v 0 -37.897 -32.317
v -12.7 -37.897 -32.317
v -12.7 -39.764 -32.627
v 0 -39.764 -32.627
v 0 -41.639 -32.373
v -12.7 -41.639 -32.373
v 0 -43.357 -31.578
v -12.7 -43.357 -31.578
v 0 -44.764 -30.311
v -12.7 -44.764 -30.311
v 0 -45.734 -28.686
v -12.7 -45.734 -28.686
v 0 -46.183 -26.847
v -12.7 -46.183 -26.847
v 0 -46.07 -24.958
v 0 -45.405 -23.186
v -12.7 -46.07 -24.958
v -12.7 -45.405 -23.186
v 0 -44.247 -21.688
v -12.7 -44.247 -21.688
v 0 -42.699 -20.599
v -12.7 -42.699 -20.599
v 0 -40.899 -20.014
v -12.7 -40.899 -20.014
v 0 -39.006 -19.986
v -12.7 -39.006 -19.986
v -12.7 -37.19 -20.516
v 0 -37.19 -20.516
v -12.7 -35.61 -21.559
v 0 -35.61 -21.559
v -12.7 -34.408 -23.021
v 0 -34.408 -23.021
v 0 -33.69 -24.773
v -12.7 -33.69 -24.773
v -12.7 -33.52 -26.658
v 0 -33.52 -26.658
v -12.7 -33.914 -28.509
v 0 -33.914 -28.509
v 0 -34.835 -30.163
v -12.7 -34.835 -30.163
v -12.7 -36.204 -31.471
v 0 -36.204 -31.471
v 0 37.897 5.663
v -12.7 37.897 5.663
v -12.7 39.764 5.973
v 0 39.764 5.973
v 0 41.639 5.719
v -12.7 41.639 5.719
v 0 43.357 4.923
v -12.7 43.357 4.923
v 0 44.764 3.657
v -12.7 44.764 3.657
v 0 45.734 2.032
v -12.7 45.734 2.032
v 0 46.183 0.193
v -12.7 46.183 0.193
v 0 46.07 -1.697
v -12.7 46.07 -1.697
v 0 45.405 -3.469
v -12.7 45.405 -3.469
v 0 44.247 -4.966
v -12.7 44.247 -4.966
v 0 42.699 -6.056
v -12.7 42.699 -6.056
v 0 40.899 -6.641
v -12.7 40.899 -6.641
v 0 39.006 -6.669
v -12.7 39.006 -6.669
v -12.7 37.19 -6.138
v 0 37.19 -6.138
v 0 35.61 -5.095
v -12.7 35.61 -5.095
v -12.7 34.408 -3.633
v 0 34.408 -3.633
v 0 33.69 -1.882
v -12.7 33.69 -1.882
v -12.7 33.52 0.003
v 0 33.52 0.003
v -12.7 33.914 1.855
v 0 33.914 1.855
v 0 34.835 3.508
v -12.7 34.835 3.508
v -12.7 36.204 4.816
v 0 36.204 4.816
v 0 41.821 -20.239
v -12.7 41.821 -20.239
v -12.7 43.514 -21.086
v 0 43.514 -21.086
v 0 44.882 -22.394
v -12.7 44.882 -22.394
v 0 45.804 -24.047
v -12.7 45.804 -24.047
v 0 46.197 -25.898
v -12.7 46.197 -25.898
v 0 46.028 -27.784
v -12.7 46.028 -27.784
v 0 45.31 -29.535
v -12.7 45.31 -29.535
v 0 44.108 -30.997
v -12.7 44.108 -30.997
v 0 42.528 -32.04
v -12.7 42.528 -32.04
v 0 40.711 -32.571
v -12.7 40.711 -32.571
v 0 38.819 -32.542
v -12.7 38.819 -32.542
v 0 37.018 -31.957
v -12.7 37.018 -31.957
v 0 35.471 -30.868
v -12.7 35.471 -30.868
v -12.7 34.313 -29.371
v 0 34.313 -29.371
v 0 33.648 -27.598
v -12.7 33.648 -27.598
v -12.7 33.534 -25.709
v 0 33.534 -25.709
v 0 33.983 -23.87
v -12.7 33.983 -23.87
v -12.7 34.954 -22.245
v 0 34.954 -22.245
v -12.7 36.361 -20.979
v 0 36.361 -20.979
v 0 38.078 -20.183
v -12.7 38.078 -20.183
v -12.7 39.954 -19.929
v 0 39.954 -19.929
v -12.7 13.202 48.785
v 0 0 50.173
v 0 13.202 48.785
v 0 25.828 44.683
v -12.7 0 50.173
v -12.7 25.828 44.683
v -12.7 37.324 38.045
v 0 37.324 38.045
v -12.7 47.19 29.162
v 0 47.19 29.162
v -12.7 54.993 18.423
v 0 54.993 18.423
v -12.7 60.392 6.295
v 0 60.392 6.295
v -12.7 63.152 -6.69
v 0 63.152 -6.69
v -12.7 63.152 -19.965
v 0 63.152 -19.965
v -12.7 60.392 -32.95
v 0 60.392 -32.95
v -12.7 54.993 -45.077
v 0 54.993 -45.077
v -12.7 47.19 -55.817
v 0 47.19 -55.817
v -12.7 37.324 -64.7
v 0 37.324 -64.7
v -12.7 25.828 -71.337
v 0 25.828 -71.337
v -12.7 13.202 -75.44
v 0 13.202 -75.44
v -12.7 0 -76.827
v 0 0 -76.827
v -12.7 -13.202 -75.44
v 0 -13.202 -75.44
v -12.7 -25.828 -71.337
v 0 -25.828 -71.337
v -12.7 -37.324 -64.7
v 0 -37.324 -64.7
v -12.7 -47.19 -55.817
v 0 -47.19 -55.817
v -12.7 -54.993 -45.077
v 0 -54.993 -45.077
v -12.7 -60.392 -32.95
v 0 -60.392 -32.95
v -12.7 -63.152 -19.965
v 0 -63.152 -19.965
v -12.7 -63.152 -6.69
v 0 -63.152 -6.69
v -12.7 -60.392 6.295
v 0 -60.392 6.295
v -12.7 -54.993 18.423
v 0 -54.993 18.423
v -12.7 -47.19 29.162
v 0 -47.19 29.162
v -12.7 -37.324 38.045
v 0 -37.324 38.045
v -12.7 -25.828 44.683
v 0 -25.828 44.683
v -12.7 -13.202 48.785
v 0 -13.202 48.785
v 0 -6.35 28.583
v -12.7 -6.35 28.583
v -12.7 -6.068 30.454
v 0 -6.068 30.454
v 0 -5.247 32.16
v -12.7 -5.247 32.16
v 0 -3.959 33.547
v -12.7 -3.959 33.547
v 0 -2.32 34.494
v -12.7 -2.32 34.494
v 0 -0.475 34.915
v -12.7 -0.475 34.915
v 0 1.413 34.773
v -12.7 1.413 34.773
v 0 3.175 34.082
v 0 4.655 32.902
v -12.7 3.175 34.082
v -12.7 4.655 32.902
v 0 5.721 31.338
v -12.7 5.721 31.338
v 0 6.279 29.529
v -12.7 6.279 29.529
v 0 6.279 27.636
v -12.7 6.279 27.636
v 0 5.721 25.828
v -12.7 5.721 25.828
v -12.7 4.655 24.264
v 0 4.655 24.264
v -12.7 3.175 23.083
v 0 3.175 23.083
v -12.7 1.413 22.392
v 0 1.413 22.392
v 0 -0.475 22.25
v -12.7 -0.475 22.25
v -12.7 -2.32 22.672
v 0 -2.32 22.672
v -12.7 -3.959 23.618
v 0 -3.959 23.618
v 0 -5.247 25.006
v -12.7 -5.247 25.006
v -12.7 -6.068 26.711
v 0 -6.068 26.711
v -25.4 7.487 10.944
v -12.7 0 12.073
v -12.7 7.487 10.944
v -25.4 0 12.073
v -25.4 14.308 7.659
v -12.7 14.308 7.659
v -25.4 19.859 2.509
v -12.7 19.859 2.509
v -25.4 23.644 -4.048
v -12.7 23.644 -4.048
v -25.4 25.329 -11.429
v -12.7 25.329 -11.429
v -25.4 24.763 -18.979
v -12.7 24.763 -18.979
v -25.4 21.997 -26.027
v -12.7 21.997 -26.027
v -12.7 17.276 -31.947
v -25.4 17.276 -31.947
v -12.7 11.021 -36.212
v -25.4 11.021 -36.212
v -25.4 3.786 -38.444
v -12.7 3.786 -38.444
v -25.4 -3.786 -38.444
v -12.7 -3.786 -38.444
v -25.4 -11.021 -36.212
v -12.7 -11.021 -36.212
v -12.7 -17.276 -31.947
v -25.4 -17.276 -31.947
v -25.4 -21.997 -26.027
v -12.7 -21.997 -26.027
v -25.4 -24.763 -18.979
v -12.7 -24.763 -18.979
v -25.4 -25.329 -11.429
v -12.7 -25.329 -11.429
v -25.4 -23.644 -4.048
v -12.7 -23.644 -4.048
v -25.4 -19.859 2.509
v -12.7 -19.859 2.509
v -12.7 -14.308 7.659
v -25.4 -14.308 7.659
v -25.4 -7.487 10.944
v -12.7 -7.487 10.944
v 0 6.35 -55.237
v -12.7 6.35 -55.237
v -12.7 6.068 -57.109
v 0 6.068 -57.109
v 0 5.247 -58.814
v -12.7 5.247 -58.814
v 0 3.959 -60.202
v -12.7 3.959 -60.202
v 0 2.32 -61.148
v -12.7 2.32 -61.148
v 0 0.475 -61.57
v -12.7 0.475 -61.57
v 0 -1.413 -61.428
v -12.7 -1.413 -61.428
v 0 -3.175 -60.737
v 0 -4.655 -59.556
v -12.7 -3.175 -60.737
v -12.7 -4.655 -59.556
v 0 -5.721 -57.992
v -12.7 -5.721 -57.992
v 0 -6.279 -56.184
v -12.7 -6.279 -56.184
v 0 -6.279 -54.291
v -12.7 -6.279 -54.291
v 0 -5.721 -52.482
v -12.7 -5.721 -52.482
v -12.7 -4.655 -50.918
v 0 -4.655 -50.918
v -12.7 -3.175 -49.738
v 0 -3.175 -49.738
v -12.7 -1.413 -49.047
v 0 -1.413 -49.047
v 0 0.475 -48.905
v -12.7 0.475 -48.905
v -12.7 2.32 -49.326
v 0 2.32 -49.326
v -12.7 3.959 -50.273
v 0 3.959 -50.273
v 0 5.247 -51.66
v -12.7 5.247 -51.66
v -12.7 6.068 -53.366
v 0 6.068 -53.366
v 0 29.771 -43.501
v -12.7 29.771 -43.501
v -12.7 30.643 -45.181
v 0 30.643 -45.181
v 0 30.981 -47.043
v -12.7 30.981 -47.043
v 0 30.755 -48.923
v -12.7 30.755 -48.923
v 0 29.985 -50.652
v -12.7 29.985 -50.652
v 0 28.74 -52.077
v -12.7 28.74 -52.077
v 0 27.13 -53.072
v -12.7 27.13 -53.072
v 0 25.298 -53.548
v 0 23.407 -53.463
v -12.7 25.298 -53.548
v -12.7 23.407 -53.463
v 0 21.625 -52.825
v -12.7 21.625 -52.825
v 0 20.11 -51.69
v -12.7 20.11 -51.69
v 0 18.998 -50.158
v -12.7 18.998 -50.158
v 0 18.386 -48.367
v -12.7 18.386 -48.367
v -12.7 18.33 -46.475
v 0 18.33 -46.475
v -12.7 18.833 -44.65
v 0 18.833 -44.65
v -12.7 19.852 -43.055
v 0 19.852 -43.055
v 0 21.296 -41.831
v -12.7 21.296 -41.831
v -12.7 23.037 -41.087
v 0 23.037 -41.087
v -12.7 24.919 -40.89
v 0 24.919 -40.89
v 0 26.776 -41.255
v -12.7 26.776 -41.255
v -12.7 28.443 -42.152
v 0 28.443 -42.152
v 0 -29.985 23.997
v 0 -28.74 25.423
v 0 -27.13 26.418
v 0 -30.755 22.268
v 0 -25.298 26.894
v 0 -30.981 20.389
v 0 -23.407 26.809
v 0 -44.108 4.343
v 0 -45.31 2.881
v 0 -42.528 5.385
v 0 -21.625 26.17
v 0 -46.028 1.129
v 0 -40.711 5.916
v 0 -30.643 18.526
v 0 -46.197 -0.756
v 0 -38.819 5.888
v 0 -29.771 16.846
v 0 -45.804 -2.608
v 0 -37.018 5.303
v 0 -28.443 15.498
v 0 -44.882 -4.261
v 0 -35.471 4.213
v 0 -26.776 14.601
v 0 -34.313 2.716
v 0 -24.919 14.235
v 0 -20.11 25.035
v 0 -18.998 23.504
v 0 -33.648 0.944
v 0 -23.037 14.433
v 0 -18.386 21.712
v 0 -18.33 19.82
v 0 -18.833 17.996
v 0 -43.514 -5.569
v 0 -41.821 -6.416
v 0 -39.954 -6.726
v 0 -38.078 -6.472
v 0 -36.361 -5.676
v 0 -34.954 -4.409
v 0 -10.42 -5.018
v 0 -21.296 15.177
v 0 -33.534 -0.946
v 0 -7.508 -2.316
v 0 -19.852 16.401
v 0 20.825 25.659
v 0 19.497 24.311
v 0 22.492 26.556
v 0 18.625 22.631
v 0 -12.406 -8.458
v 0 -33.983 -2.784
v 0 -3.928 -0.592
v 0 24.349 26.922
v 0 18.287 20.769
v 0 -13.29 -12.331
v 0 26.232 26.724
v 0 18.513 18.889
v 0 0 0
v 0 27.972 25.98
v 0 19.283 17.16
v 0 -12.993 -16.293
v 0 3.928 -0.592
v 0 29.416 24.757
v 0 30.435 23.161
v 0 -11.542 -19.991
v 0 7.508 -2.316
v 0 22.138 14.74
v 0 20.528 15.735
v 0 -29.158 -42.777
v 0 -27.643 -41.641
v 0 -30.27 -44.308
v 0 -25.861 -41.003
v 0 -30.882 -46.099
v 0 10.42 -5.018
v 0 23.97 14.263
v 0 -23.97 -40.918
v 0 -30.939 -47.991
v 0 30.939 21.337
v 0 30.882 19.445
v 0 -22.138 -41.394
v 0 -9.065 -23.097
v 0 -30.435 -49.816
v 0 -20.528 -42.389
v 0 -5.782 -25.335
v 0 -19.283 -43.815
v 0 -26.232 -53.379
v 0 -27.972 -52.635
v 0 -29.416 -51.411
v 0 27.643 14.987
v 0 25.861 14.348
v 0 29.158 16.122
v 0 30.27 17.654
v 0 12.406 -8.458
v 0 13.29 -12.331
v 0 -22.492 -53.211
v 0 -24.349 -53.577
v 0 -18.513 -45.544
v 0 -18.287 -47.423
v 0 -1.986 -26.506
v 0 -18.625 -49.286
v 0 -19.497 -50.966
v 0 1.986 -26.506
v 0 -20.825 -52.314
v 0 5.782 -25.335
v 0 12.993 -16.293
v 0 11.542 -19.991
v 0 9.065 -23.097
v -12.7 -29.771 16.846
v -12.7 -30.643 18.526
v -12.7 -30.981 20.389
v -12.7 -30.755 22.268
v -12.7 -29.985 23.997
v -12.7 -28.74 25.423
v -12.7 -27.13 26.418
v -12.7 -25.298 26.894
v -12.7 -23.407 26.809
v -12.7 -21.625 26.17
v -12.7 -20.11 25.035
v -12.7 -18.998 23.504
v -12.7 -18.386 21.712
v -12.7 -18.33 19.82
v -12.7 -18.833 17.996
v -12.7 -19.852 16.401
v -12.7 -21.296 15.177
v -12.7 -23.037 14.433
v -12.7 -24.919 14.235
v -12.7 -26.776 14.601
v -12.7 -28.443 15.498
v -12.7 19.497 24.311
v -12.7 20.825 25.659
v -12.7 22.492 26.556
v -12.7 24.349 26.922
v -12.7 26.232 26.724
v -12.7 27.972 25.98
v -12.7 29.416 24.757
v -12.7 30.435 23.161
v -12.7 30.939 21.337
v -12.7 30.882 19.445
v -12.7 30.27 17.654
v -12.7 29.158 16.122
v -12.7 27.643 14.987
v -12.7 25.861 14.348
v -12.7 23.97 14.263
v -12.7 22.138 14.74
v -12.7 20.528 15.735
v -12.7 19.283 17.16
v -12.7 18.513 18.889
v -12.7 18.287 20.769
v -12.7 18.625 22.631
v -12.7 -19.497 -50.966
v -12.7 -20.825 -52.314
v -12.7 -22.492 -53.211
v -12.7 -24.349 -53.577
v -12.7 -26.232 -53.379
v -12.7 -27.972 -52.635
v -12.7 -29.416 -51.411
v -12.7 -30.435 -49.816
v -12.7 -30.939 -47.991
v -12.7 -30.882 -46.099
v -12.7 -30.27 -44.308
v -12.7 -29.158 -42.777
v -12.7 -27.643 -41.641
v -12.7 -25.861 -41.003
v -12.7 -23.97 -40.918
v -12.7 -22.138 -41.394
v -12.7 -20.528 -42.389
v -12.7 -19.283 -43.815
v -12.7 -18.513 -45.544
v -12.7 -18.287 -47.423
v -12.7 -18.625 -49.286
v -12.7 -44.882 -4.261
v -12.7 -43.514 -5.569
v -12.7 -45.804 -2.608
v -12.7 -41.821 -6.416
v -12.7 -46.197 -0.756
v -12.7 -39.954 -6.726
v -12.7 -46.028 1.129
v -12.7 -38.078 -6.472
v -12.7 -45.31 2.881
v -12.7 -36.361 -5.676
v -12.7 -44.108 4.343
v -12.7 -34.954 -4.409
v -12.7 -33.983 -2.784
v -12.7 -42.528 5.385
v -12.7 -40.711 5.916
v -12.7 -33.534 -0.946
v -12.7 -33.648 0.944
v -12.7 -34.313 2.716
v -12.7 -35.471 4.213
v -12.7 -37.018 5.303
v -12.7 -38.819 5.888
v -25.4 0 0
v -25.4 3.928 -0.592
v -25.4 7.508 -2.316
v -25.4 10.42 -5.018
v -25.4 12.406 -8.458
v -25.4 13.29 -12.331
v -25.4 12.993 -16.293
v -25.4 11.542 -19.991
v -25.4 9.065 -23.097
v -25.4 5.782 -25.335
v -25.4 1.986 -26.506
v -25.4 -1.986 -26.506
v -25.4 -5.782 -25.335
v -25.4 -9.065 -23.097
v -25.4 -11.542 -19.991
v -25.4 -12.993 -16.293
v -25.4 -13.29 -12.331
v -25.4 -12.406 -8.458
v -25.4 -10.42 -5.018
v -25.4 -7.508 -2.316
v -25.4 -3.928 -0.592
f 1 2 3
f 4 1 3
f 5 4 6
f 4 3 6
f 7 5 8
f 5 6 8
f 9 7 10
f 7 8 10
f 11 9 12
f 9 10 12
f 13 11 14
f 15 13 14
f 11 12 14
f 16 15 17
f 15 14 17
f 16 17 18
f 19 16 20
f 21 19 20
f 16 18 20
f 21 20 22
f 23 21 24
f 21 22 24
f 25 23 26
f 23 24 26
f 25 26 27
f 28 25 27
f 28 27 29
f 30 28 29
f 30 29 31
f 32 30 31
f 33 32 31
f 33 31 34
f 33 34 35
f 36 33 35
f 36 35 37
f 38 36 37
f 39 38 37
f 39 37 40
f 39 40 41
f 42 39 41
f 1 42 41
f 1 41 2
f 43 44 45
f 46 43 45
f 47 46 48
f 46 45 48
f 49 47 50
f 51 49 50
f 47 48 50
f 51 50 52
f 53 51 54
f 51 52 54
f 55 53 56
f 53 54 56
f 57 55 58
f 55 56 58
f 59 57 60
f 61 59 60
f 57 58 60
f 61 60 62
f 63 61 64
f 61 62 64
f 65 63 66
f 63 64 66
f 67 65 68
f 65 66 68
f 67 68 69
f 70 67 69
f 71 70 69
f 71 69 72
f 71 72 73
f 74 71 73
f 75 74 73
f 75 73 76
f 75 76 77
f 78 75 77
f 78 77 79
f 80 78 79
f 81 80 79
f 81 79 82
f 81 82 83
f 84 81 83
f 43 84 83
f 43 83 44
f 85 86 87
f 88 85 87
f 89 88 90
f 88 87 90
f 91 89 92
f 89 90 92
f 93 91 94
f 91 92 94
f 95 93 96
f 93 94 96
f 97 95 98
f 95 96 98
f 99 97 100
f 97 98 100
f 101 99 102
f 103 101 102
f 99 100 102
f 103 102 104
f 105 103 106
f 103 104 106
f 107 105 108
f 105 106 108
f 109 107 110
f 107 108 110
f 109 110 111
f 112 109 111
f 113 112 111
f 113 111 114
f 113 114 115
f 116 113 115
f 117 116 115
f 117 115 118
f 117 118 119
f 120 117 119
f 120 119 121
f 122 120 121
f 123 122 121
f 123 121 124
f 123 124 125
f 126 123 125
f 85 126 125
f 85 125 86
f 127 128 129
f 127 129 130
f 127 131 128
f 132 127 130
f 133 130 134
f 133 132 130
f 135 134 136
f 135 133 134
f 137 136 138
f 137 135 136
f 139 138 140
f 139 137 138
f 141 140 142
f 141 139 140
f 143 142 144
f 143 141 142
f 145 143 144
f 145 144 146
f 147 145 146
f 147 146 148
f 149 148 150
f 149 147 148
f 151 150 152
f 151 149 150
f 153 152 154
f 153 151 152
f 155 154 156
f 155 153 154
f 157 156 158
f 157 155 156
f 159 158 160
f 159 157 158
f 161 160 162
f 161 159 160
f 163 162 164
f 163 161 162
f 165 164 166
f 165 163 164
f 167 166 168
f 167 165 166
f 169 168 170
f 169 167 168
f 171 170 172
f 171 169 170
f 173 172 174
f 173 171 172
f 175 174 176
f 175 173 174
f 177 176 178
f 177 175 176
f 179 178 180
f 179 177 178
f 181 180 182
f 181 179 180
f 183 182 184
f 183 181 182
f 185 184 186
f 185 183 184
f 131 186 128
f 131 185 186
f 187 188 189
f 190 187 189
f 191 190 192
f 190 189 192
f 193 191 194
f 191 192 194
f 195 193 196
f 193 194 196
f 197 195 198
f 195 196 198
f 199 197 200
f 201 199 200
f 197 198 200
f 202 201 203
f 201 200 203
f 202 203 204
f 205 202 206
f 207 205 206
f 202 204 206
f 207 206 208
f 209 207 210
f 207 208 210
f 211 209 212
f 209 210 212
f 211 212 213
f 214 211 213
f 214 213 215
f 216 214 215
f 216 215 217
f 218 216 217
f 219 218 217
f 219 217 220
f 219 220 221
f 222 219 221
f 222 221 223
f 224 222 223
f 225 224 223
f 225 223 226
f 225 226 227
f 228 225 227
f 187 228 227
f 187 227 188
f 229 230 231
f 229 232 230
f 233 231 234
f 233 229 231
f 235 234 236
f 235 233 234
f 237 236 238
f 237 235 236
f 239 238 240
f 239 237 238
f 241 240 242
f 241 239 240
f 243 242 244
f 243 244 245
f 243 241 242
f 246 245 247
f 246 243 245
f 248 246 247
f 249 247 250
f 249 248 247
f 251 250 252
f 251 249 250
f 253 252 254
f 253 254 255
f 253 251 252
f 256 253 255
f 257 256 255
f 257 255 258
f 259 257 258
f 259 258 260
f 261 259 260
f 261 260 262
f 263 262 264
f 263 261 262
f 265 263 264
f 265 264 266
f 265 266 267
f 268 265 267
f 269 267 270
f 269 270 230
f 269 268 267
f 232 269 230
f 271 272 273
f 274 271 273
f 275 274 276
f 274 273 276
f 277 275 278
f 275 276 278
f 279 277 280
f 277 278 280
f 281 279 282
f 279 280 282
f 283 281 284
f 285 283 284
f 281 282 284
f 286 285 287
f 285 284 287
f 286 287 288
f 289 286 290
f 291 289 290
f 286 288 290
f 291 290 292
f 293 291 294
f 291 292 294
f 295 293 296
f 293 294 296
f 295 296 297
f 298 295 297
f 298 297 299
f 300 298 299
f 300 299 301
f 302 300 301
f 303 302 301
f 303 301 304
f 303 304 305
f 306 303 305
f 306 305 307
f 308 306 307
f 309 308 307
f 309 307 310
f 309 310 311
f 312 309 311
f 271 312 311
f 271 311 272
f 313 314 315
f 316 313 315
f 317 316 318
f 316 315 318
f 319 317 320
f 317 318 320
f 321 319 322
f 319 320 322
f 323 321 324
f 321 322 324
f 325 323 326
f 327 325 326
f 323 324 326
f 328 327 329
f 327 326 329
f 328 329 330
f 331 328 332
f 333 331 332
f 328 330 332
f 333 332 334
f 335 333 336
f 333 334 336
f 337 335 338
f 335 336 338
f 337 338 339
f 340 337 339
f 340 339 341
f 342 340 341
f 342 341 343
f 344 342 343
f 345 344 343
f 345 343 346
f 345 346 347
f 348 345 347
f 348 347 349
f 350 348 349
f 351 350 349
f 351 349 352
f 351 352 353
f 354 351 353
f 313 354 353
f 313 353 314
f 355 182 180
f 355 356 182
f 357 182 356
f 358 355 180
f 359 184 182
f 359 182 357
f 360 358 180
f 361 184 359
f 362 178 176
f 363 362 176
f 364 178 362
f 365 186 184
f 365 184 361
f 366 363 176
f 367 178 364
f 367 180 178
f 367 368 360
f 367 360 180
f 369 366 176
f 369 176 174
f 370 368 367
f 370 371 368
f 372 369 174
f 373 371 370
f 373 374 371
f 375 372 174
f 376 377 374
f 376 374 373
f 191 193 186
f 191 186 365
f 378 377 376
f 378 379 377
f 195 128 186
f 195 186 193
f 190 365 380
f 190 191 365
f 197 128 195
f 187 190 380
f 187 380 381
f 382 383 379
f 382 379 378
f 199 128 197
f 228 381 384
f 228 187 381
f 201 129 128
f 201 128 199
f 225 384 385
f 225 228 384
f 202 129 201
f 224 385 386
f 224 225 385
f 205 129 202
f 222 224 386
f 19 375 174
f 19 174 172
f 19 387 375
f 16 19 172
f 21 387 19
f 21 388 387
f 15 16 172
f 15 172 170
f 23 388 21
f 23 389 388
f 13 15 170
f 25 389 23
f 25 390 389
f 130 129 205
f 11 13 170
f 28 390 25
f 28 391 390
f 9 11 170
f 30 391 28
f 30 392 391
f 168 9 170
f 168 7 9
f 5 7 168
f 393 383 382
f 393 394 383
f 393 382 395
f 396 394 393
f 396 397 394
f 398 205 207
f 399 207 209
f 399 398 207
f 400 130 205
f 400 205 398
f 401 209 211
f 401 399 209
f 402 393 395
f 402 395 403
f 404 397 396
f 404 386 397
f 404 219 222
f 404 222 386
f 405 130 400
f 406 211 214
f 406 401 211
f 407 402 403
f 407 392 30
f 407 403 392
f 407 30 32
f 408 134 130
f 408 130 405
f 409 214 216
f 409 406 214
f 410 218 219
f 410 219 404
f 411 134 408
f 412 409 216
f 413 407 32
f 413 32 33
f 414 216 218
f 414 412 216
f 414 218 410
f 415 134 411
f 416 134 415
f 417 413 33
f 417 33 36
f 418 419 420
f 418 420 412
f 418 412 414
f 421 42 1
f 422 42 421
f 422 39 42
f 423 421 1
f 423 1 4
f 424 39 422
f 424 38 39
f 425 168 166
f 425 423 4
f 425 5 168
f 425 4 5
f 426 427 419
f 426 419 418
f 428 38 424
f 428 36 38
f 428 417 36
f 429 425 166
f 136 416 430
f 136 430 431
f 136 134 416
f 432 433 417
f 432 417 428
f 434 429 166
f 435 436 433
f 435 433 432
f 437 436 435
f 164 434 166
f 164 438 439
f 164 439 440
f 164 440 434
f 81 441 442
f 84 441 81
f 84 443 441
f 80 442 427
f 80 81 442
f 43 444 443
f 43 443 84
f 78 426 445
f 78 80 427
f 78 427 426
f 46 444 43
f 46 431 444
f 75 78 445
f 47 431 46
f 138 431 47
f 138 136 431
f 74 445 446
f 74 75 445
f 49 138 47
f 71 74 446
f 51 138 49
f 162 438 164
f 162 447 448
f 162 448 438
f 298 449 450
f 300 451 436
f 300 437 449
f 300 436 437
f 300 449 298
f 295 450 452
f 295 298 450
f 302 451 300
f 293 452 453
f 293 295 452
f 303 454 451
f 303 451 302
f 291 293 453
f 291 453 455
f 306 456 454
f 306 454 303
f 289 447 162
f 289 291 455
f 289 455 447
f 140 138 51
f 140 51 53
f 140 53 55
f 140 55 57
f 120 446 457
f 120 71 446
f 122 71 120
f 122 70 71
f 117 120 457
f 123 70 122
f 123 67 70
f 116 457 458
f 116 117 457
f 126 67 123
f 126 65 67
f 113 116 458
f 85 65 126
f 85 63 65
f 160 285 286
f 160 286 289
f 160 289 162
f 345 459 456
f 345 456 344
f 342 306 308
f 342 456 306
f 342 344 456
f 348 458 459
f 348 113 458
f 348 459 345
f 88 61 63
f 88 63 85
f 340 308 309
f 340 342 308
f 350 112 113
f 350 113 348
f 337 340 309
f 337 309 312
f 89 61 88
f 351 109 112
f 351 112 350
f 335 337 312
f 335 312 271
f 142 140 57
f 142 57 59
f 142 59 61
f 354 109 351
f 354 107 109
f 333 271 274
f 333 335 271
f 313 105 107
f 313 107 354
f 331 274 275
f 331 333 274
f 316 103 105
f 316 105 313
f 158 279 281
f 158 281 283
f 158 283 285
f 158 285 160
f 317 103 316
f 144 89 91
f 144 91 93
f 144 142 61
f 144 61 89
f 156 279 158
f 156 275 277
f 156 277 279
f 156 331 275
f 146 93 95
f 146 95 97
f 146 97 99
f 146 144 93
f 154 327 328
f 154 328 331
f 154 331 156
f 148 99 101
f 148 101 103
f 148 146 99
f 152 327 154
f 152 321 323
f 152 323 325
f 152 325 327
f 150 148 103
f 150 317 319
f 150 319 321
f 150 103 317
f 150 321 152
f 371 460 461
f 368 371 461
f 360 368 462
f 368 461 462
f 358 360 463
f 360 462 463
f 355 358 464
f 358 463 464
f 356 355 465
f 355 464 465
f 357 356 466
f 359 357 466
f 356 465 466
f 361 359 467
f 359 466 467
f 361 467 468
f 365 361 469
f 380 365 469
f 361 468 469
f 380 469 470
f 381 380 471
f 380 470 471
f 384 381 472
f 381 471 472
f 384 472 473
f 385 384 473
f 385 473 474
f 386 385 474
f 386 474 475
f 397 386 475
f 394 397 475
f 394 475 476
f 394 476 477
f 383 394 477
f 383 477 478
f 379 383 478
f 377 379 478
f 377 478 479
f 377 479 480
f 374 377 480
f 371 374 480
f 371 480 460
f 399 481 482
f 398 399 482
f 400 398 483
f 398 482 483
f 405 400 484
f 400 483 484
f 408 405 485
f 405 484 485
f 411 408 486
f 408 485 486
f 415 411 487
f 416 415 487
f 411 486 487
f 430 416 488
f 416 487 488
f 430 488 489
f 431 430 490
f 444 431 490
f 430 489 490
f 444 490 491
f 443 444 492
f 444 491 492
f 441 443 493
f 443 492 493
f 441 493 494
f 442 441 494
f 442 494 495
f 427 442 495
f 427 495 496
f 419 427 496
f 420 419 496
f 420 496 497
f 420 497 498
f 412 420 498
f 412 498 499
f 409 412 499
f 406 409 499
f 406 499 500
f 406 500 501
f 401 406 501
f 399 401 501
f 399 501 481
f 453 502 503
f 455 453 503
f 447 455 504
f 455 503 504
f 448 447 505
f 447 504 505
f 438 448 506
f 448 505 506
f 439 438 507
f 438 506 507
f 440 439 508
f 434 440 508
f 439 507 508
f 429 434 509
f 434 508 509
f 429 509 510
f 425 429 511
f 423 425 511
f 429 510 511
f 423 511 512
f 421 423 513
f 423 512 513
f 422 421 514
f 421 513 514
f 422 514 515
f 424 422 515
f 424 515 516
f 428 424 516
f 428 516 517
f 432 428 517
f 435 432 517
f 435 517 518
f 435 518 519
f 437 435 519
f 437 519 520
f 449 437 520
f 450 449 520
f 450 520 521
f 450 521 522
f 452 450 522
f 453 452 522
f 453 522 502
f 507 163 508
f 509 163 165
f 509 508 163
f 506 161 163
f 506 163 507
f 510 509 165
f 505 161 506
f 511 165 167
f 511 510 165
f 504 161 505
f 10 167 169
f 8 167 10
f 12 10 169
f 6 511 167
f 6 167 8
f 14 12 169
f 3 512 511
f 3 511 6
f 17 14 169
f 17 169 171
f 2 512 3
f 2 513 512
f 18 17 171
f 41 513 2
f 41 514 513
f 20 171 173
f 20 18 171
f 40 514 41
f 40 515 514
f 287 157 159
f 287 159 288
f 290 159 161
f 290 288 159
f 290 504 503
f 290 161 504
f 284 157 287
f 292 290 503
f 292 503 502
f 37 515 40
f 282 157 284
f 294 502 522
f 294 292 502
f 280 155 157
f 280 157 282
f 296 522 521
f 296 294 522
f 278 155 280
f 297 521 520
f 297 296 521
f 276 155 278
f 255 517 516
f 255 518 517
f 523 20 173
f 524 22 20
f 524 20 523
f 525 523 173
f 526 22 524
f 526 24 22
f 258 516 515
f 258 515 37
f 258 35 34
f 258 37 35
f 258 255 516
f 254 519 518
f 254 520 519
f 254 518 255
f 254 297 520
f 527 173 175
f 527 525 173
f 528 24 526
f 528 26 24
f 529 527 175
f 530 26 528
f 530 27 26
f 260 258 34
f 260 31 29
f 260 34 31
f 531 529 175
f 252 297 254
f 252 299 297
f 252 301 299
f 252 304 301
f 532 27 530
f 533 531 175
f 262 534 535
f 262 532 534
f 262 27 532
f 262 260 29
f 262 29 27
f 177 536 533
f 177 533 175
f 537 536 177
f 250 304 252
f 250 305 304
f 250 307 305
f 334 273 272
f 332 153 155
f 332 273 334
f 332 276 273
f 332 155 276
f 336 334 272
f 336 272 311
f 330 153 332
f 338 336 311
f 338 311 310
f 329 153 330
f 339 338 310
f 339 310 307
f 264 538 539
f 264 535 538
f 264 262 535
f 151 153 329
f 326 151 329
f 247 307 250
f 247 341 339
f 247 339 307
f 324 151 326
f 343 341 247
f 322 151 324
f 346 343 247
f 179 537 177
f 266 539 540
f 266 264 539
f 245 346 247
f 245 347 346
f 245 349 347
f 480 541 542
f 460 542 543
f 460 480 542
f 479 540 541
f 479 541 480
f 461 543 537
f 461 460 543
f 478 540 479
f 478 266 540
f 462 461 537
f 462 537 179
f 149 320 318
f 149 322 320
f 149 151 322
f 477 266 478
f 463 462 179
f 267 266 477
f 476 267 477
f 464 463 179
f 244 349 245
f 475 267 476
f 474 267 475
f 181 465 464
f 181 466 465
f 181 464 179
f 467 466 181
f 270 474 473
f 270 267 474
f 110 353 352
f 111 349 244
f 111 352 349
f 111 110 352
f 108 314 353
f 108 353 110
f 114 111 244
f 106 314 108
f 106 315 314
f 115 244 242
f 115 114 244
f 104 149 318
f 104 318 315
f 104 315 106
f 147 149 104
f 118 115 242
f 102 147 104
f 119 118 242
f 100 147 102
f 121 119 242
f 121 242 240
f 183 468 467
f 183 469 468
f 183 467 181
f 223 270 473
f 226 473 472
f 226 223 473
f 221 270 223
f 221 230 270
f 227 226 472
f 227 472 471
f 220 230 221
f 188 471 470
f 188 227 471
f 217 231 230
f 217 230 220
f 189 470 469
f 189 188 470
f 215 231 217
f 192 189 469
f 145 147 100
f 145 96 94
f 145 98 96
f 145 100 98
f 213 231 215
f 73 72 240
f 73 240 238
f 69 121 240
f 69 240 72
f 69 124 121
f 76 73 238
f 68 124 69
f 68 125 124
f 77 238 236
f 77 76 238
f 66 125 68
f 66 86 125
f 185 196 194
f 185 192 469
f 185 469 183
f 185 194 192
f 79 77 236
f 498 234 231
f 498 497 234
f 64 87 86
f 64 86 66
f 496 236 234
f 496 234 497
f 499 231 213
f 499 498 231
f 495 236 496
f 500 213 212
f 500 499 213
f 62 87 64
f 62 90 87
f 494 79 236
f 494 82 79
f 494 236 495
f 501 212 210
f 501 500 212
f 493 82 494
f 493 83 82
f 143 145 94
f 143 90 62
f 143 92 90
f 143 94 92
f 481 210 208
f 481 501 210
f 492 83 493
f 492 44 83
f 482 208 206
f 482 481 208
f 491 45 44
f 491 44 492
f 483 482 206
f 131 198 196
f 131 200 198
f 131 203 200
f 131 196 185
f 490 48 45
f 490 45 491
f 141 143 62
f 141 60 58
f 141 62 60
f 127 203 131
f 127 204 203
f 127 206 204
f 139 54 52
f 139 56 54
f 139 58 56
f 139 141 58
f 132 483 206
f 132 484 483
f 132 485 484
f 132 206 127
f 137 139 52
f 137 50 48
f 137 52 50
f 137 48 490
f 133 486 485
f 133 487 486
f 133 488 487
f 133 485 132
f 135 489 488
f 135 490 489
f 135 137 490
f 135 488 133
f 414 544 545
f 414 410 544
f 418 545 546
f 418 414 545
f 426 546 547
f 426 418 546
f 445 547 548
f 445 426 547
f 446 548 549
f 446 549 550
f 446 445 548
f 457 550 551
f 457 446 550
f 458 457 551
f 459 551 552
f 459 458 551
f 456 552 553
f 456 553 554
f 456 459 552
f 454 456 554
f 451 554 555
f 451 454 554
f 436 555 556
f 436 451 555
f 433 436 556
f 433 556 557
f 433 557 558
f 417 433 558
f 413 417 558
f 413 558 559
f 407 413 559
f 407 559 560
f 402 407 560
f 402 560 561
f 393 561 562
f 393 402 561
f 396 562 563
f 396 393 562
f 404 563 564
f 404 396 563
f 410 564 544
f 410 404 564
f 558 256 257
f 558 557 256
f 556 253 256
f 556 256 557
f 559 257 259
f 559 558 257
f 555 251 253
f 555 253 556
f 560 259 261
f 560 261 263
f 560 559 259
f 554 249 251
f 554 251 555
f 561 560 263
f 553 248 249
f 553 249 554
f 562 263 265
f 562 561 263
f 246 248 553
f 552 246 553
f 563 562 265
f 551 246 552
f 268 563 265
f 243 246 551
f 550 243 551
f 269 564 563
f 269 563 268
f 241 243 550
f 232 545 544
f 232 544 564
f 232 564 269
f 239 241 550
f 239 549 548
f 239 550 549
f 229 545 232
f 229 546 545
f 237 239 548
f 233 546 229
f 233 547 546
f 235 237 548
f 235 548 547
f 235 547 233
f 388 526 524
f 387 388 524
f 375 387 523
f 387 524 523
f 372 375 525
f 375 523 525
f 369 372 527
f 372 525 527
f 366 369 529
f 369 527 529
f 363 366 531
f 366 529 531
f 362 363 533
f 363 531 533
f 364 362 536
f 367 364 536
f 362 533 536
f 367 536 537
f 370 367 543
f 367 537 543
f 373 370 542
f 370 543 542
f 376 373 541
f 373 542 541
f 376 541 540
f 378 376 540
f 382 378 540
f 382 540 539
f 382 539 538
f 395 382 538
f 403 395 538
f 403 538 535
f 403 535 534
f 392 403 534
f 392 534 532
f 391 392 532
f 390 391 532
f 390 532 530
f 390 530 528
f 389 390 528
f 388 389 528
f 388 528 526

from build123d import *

# Parameters (mm, degrees)
F3_D            = 12.7
F3_COPIES_COUNT = 10


# Not quite as in the source:
# - a pattern or mirror of a feature is missing from the dataset's text; its kind, count and spacing are read off the source's solid


with BuildPart() as f1:
    # F0 (on Front) → F1 (revolve)
    with BuildSketch(Plane.XZ):
        Polygon((-25.4, 0), (0, 0), (0, 50.172699946), (-12.7, 50.172699946), (-12.7, 12.072699946), (-25.4, 12.072699946), align=None)
    revolve(axis=Axis((-12.7, 0, -13.327300054), (-1, 0, 0)))

    # F3 (through all)
    with Locations(Plane.YZ):
        with Locations((0, 28.582699946)):
            f3 = Hole(F3_D / 2)

    # F3_copies: F3 ×10 about axis
    f3_copies_axis = Axis((0, 0, -13.3273), (1, 0, 0))
    for i in range(1, F3_COPIES_COUNT):
        add(f3.rotate(f3_copies_axis, i * 360 / F3_COPIES_COUNT), mode=Mode.SUBTRACT)


solid = f1.part
